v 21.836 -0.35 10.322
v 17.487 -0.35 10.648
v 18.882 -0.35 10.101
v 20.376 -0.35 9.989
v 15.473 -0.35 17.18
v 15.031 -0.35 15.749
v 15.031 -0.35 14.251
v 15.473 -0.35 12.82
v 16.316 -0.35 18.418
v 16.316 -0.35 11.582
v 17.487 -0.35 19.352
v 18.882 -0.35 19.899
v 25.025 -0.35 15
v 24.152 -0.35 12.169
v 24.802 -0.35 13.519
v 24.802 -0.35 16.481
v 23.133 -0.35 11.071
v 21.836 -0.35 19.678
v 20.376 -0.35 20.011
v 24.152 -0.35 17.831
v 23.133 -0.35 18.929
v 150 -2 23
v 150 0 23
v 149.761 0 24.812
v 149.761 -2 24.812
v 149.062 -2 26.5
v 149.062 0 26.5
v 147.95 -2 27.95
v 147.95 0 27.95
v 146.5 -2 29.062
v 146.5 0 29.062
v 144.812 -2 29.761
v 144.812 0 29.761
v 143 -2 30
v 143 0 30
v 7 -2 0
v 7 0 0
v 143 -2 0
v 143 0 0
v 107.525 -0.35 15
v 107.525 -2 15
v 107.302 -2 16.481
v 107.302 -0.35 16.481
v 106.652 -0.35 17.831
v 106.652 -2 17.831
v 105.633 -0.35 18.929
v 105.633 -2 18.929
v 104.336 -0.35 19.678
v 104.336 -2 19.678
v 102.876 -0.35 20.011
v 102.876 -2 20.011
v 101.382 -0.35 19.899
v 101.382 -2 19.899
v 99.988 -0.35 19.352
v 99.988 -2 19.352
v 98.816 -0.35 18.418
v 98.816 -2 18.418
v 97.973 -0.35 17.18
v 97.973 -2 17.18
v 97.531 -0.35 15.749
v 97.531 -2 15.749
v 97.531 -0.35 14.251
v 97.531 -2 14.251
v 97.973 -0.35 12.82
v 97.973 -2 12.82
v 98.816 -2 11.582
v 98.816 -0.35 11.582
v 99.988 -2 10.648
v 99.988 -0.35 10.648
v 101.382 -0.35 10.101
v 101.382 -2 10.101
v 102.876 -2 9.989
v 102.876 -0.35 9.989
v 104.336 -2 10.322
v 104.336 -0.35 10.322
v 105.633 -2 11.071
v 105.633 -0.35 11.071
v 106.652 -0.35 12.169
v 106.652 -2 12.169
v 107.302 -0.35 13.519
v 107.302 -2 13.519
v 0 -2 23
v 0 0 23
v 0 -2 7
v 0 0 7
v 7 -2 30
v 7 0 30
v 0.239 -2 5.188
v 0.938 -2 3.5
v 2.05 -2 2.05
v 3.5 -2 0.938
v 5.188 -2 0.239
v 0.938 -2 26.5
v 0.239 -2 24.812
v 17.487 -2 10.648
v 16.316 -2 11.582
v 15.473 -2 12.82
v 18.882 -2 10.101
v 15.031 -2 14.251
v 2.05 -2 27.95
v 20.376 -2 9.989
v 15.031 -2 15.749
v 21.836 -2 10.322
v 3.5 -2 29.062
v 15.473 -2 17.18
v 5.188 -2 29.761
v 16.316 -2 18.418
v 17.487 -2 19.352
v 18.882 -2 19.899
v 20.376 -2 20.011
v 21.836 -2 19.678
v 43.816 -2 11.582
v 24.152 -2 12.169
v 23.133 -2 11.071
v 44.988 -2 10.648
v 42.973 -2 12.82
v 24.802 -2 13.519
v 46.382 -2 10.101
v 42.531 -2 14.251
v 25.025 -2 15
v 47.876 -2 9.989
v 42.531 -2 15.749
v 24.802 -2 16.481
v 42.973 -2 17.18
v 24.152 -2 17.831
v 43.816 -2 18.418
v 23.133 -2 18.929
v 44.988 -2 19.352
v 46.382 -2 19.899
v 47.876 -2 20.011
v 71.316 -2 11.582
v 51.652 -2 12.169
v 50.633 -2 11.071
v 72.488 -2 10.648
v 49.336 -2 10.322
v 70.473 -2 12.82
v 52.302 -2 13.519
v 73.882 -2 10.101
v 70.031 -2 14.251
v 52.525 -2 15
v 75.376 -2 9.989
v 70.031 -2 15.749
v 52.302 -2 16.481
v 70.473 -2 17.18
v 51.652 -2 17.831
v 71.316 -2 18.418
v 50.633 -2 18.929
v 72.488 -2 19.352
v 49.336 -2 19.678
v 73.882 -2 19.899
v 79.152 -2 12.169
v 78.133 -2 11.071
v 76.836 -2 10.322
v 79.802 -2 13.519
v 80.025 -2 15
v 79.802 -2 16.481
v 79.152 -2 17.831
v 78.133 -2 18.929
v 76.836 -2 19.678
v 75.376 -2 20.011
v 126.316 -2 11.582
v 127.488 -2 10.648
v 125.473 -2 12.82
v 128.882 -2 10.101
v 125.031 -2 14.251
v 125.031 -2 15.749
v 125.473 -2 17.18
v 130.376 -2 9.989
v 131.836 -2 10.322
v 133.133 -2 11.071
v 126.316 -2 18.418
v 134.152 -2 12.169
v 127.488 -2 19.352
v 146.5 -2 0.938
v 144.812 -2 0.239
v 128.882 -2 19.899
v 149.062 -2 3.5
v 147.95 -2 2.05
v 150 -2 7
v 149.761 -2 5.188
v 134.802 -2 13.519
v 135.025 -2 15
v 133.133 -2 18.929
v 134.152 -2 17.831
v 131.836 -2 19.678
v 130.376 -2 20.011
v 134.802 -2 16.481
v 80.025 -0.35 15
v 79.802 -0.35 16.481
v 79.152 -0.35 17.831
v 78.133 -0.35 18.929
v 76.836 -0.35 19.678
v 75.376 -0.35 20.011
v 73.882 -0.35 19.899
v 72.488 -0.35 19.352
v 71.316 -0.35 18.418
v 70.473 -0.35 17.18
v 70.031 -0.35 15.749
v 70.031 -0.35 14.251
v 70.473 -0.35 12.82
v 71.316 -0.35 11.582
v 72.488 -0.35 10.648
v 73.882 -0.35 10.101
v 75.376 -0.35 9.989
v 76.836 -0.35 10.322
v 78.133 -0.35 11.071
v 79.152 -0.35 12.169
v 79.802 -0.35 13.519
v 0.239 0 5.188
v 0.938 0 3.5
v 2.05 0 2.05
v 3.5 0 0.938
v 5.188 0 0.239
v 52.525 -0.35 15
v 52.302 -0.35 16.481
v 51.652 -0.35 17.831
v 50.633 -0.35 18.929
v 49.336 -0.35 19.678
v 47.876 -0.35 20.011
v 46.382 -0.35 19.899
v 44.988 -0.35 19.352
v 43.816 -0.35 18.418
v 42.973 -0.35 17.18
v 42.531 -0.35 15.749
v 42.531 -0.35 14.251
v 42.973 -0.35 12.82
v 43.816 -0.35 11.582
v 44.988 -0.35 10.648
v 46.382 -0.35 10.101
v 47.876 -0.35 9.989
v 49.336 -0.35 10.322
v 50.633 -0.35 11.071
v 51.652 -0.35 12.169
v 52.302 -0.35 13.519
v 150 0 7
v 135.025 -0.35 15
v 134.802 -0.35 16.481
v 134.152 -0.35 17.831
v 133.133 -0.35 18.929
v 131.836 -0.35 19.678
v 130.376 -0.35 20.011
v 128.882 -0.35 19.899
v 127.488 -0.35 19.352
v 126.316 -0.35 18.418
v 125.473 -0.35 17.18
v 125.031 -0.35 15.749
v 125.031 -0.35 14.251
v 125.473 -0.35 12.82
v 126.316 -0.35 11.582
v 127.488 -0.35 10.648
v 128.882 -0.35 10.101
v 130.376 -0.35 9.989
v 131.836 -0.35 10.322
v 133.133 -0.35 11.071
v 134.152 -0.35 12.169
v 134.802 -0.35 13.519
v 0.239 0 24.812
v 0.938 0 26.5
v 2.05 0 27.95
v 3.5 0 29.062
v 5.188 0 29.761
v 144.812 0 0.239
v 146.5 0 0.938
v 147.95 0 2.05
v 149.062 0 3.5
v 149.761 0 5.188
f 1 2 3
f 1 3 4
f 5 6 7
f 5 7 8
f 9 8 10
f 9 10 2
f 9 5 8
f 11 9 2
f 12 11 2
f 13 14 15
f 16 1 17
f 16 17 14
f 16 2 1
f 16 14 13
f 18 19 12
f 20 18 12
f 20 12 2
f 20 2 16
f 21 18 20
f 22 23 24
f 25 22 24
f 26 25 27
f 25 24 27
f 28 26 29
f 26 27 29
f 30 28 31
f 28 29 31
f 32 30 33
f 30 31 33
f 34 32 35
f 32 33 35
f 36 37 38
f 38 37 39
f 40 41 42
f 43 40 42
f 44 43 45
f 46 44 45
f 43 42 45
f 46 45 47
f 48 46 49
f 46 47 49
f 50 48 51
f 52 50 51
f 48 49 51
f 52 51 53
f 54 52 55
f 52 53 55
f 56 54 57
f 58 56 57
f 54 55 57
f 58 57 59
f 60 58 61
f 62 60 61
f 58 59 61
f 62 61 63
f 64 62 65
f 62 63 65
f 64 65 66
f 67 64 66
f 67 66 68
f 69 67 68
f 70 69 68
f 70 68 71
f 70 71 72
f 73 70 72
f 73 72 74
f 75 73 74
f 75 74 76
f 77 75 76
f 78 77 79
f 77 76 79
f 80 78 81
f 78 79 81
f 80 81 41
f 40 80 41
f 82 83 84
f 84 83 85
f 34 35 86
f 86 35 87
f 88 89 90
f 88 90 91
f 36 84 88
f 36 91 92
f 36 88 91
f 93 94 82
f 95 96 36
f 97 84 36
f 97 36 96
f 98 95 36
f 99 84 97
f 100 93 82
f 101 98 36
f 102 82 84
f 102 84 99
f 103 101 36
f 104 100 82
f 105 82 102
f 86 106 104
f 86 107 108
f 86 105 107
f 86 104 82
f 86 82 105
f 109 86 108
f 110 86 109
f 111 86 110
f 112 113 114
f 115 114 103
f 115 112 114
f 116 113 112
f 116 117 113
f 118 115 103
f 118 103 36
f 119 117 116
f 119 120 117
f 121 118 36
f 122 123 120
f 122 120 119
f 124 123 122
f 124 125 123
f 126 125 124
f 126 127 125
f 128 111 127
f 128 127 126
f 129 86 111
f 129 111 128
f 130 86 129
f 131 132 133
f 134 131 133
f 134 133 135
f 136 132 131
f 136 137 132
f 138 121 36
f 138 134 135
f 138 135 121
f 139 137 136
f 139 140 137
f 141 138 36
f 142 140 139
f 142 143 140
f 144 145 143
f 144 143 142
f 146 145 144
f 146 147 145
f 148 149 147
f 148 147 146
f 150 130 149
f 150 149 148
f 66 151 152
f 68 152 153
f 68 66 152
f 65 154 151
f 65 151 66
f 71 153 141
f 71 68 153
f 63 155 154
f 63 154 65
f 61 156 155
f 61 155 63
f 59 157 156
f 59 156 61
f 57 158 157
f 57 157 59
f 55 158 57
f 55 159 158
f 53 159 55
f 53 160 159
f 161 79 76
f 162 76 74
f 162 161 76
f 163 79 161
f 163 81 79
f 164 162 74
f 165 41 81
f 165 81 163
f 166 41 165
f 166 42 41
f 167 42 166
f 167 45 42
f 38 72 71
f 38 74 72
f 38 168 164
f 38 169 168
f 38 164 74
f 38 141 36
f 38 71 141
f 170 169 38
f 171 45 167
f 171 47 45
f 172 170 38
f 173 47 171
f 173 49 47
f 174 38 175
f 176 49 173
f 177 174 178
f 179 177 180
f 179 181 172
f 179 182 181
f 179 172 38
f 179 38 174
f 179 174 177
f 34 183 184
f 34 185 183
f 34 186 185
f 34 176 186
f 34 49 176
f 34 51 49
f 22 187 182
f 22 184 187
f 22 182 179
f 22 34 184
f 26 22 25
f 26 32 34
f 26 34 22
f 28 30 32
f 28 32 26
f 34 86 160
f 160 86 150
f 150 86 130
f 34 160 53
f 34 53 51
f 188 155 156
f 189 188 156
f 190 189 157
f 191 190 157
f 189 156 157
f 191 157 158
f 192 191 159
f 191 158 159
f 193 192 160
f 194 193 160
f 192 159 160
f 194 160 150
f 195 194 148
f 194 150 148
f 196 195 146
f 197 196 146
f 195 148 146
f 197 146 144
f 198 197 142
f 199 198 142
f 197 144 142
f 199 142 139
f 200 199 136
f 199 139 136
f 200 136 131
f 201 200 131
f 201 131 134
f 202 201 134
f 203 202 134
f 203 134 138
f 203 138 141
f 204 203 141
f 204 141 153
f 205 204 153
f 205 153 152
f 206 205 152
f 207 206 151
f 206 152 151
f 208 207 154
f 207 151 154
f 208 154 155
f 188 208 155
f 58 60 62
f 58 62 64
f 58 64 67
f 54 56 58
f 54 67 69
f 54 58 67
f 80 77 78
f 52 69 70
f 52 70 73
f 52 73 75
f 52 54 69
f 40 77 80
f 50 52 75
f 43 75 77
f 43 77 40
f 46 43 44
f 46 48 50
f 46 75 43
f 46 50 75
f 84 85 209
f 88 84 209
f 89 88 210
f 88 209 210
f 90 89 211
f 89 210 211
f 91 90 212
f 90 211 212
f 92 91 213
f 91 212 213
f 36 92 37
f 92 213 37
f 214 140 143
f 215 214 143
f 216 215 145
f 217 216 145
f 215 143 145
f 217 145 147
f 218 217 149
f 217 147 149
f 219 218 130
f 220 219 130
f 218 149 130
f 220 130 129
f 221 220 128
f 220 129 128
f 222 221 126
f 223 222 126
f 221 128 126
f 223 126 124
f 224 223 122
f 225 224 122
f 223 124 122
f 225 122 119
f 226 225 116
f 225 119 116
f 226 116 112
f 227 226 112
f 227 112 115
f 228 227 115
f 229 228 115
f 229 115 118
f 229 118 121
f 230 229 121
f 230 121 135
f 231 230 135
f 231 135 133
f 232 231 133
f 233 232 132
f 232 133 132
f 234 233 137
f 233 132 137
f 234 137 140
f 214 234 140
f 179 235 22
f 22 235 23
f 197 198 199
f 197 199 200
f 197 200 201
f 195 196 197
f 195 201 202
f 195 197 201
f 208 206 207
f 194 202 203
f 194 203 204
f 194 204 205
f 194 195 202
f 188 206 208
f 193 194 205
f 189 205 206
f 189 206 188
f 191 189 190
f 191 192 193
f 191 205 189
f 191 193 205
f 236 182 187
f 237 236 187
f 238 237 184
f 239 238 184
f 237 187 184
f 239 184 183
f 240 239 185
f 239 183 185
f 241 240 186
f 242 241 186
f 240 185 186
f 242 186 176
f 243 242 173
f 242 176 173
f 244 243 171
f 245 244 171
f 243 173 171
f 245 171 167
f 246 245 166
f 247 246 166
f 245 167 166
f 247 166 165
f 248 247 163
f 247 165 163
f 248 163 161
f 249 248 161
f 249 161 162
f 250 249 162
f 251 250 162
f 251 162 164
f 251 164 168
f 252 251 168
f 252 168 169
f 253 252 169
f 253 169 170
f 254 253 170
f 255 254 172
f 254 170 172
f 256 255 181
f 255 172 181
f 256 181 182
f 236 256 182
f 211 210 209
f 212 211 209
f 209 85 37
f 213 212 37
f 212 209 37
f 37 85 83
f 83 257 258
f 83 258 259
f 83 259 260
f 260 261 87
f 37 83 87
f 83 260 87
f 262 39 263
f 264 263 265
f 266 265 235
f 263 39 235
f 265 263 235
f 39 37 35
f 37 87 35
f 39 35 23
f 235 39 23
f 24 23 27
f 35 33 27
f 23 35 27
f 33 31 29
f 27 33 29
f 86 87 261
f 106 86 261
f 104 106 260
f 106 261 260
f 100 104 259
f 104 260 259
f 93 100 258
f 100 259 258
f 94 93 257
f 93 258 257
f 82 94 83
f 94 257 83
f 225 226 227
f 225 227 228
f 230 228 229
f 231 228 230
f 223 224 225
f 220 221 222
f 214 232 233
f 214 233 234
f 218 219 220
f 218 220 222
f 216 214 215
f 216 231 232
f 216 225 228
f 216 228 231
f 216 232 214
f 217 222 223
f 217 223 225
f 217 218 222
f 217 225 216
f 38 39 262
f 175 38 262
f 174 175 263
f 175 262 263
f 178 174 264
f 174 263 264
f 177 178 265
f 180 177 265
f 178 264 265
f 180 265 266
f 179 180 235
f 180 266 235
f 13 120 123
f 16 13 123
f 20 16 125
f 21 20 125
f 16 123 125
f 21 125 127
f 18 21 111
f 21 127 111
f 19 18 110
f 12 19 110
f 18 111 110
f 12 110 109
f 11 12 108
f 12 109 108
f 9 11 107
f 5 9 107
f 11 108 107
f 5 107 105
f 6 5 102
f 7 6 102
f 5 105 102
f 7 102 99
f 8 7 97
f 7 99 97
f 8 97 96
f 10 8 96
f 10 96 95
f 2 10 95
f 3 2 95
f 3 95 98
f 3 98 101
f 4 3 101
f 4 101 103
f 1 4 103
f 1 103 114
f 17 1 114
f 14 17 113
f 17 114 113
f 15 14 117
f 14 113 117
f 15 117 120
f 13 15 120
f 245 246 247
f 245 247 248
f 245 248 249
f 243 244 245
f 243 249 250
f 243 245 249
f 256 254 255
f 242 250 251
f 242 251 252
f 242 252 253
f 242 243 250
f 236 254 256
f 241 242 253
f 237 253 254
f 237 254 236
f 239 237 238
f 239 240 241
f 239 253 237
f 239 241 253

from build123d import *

# Parameters (mm, degrees)
F1_DEPTH = 2
F2_R     = 5.025
F3_DEPTH = 1.65


with BuildPart() as f1:
    # F0 (on Front) → F1 (new body)
    with BuildSketch(Plane.XZ):
        with BuildLine():
            ThreePointArc((0, 7), (2.050253, 2.050253), (7, 0))
            Line((7, 0), (143, 0))
            ThreePointArc((143, 0), (147.949747, 2.050253), (150, 7))
            Line((150, 7), (150, 23))
            ThreePointArc((150, 23), (147.949747, 27.949747), (143, 30))
            Line((143, 30), (7, 30))
            ThreePointArc((7, 30), (2.050253, 27.949747), (0, 23))
            Line((0, 23), (0, 7))
        make_face()
    extrude(amount=F1_DEPTH)

    # F2 (on face) → F3 (cut)
    with BuildSketch(Plane.XZ.offset(2)):
        with Locations((20, 15)):
            Circle(F2_R)
        with Locations((47.5, 15)):
            Circle(F2_R)
        with Locations((75, 15)):
            Circle(F2_R)
        with Locations((102.5, 15)):
            Circle(F2_R)
        with Locations((130, 15)):
            Circle(F2_R)
    extrude(amount=-F3_DEPTH, mode=Mode.SUBTRACT)


solid = f1.part
